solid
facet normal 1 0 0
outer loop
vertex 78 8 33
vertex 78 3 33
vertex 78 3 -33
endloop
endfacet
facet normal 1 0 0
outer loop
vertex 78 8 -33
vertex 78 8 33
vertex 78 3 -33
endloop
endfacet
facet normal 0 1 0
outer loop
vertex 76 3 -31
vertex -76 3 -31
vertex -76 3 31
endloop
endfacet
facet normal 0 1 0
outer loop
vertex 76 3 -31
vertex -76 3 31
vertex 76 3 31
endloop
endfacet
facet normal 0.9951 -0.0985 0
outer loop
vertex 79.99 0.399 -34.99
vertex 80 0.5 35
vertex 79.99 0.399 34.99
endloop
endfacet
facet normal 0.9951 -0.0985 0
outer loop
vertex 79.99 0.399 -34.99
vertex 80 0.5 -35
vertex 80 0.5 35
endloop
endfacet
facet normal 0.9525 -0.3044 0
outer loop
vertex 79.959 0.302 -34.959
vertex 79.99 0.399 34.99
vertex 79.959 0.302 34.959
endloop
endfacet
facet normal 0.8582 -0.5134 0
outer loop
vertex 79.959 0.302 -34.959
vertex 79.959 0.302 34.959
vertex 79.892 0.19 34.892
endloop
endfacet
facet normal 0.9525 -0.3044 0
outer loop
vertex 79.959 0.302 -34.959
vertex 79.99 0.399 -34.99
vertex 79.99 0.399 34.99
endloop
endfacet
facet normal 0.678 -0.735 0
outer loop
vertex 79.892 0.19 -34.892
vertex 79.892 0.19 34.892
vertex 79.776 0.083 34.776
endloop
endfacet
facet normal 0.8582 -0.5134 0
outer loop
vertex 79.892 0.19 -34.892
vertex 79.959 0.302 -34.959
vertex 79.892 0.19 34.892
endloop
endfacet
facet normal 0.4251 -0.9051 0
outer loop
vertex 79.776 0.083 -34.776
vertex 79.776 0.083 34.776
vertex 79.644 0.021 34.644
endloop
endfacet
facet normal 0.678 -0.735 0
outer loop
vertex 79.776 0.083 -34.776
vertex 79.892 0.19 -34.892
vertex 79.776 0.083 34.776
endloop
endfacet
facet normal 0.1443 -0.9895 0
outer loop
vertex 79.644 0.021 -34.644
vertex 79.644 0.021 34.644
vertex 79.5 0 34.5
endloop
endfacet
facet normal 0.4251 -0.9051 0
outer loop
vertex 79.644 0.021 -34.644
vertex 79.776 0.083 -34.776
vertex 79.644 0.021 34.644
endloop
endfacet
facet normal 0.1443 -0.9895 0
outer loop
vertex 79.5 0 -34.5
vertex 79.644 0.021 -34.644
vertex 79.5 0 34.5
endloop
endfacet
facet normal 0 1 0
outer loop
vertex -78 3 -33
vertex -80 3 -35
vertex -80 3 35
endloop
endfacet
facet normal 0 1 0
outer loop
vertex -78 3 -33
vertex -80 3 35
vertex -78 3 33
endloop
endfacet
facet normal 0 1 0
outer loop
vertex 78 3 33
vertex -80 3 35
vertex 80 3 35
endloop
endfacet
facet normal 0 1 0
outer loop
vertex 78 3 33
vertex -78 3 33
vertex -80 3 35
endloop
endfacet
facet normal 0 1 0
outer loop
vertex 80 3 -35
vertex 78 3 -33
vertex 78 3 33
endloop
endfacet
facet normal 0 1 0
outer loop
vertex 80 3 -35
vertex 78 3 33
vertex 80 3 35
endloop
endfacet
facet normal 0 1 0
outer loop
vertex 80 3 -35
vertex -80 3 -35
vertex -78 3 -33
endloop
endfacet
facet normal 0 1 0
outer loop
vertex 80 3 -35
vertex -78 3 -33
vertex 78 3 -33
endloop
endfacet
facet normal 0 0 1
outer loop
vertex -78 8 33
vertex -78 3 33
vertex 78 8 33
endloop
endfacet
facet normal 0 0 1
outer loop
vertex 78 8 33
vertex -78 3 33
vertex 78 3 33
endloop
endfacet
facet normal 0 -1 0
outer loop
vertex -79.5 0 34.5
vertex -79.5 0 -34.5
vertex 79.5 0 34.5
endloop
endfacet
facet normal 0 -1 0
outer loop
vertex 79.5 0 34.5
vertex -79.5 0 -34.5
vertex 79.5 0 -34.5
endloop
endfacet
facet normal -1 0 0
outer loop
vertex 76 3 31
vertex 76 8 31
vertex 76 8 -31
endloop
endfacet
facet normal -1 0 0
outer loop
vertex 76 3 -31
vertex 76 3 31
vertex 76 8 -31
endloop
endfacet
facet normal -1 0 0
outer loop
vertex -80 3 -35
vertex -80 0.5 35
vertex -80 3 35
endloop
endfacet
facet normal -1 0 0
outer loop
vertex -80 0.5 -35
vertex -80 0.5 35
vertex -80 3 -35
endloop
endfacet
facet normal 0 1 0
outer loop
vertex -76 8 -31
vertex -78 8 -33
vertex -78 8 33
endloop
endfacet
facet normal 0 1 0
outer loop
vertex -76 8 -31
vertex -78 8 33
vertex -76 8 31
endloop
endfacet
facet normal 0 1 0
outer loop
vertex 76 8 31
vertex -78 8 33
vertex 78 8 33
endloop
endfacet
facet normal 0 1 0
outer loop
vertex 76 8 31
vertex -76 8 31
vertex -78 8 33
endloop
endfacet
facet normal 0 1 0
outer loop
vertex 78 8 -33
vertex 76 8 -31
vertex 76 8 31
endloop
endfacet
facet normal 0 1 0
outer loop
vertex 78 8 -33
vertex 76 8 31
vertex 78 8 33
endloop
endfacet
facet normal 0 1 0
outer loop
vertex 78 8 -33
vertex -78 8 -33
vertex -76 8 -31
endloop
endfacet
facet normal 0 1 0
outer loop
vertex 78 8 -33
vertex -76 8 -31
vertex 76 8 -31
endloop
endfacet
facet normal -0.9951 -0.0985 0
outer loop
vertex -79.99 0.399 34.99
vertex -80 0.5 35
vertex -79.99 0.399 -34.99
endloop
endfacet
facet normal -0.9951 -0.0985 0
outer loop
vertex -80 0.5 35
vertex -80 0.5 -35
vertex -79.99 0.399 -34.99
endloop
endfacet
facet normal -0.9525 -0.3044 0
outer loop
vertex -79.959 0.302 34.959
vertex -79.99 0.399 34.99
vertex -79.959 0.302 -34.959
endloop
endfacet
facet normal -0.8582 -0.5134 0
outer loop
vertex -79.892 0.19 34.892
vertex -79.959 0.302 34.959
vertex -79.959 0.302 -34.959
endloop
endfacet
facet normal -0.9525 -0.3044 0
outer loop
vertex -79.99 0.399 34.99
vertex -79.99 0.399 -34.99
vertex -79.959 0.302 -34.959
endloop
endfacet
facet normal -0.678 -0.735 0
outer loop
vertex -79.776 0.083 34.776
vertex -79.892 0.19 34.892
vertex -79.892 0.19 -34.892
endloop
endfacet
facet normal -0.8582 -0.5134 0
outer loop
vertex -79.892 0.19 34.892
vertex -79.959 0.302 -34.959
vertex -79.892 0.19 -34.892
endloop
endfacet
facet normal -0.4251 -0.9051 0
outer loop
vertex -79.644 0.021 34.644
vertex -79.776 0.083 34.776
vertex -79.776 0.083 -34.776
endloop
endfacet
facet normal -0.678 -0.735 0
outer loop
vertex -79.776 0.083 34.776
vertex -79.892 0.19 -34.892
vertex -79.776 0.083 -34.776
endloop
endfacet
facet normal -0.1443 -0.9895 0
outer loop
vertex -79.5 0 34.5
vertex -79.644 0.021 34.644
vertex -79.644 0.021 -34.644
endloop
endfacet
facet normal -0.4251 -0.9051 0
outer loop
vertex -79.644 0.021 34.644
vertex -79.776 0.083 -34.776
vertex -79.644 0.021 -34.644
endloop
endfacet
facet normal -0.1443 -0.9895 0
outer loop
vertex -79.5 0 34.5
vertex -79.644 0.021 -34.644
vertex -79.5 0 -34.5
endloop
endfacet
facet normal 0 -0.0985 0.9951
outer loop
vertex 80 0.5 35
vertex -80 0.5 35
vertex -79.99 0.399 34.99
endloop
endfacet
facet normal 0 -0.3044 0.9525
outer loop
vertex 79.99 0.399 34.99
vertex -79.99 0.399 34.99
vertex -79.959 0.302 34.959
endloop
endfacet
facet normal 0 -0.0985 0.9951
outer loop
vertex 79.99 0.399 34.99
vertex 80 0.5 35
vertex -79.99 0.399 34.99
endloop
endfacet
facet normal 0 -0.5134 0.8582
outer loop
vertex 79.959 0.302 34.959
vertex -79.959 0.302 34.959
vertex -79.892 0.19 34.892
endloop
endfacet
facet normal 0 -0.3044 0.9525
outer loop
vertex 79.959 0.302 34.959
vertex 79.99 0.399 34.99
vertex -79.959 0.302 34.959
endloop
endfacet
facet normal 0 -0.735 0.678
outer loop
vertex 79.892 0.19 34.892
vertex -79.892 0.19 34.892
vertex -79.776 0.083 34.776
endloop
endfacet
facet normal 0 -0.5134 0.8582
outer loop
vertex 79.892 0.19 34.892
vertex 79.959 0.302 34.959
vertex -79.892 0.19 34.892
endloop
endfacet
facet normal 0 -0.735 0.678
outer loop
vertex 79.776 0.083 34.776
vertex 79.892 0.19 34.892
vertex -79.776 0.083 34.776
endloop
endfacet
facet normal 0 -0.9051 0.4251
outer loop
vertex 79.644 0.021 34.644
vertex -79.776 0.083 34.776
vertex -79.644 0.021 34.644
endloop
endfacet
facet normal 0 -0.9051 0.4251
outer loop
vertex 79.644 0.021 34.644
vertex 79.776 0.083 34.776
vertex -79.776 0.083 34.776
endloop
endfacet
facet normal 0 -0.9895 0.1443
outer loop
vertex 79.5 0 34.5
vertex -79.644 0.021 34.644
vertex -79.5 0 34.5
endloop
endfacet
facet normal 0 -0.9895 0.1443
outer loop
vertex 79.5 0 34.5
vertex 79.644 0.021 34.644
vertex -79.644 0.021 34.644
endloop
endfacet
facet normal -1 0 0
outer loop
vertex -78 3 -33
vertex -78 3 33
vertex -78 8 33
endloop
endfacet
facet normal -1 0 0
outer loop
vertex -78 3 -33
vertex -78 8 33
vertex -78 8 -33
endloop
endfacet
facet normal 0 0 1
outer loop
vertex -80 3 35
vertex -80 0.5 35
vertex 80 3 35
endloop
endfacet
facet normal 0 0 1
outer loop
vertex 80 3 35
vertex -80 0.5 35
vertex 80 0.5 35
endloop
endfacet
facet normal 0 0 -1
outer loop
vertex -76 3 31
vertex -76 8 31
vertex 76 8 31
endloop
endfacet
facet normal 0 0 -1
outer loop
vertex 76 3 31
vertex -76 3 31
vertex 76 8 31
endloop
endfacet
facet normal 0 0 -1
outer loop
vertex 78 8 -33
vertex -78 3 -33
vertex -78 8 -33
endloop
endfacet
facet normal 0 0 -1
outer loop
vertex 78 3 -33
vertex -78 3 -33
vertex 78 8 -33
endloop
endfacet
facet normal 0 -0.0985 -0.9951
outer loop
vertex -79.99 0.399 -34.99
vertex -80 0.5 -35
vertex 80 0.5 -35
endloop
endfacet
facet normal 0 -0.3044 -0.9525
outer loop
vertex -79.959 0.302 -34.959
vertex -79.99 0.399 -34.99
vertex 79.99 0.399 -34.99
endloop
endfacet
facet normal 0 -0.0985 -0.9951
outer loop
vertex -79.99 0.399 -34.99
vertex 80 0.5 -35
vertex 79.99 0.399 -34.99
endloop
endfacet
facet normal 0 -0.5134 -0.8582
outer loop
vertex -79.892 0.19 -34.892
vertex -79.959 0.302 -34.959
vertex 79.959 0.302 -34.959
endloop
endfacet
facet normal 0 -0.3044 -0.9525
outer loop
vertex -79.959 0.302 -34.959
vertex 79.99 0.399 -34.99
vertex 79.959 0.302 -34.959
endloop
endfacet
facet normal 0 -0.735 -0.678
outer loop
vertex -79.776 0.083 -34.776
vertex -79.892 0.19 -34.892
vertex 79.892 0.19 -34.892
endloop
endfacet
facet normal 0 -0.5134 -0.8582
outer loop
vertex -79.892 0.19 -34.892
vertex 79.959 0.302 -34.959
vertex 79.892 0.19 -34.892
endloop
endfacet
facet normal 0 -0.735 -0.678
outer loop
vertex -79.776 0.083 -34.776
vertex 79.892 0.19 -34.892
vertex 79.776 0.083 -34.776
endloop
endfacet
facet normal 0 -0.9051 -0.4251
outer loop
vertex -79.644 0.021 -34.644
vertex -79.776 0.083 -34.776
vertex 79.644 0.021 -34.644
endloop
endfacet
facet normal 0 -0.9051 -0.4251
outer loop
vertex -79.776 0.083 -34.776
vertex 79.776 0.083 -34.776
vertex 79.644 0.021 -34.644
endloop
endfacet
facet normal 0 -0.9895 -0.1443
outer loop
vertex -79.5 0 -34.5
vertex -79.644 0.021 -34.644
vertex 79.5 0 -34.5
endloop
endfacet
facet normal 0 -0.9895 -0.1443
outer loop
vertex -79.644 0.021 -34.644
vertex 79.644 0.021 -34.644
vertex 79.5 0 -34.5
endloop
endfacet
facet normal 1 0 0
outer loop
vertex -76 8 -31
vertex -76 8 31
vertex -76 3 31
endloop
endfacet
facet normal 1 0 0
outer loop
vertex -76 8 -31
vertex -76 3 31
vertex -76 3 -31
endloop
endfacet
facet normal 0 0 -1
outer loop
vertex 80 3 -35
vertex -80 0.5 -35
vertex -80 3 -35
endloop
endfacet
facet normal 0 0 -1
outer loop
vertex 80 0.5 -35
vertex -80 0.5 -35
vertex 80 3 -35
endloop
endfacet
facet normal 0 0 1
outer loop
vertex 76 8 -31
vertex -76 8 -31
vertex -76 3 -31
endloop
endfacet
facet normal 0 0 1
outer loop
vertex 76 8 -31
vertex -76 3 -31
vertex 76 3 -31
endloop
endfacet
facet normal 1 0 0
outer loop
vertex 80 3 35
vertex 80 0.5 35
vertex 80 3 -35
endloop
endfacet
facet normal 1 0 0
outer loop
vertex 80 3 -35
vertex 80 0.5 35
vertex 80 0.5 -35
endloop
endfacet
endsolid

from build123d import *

# Parameters (mm, degrees)
SKETCH_1_W           = 160
SKETCH_1_H           = 70
SKETCH_1_W_2         = 156
SKETCH_1_H_2         = 66
EXTRUDE_1_DEPTH      = 3
EXTRUDE_2_DEPTH      = 5
EXTRUDE_2_DEPTH_BACK = 3
SKETCH_2_W           = 156
SKETCH_2_H           = 66
SKETCH_3_W           = 152
SKETCH_3_H           = 62
CUT_EXTRUDE_1_DEPTH  = 5
FILLET_1_R           = 0.5


with BuildPart() as part:
    # 스케치1 → 보스-돌출1 (new body)
    with BuildSketch(Plane(origin=(0, 0, 0), x_dir=(1, 0, 0), z_dir=(0, 1, 0))):
        Rectangle(SKETCH_1_W, SKETCH_1_H)
        Rectangle(SKETCH_1_W_2, SKETCH_1_H_2, mode=Mode.SUBTRACT)
    extrude(amount=EXTRUDE_1_DEPTH)

    # 스케치2 → 보스-돌출2 (add, two sides: drawn at the far end of the back side and taken through both)
    with BuildSketch(Plane(origin=(0, 3, 0), x_dir=(1, 0, 0), z_dir=(0, 1, 0)).offset(-EXTRUDE_2_DEPTH_BACK)):
        Rectangle(SKETCH_2_W, SKETCH_2_H)
    extrude(amount=EXTRUDE_2_DEPTH + EXTRUDE_2_DEPTH_BACK)

    # 스케치3 → 컷-돌출1 (cut)
    with BuildSketch(Plane(origin=(0, 8, 0), x_dir=(1, 0, 0), z_dir=(0, 1, 0))):
        Rectangle(SKETCH_3_W, SKETCH_3_H)
    extrude(amount=-CUT_EXTRUDE_1_DEPTH, mode=Mode.SUBTRACT)

    # 필렛1
    fillet_1_edges = [part.edges().sort_by_distance(p)[0] for p in [
        (0, 0, -35),
        (80, 0, 0),
        (0, 0, 35),
        (-80, 0, 0),
    ]]
    fillet(fillet_1_edges, radius=FILLET_1_R)


solid = part.part
